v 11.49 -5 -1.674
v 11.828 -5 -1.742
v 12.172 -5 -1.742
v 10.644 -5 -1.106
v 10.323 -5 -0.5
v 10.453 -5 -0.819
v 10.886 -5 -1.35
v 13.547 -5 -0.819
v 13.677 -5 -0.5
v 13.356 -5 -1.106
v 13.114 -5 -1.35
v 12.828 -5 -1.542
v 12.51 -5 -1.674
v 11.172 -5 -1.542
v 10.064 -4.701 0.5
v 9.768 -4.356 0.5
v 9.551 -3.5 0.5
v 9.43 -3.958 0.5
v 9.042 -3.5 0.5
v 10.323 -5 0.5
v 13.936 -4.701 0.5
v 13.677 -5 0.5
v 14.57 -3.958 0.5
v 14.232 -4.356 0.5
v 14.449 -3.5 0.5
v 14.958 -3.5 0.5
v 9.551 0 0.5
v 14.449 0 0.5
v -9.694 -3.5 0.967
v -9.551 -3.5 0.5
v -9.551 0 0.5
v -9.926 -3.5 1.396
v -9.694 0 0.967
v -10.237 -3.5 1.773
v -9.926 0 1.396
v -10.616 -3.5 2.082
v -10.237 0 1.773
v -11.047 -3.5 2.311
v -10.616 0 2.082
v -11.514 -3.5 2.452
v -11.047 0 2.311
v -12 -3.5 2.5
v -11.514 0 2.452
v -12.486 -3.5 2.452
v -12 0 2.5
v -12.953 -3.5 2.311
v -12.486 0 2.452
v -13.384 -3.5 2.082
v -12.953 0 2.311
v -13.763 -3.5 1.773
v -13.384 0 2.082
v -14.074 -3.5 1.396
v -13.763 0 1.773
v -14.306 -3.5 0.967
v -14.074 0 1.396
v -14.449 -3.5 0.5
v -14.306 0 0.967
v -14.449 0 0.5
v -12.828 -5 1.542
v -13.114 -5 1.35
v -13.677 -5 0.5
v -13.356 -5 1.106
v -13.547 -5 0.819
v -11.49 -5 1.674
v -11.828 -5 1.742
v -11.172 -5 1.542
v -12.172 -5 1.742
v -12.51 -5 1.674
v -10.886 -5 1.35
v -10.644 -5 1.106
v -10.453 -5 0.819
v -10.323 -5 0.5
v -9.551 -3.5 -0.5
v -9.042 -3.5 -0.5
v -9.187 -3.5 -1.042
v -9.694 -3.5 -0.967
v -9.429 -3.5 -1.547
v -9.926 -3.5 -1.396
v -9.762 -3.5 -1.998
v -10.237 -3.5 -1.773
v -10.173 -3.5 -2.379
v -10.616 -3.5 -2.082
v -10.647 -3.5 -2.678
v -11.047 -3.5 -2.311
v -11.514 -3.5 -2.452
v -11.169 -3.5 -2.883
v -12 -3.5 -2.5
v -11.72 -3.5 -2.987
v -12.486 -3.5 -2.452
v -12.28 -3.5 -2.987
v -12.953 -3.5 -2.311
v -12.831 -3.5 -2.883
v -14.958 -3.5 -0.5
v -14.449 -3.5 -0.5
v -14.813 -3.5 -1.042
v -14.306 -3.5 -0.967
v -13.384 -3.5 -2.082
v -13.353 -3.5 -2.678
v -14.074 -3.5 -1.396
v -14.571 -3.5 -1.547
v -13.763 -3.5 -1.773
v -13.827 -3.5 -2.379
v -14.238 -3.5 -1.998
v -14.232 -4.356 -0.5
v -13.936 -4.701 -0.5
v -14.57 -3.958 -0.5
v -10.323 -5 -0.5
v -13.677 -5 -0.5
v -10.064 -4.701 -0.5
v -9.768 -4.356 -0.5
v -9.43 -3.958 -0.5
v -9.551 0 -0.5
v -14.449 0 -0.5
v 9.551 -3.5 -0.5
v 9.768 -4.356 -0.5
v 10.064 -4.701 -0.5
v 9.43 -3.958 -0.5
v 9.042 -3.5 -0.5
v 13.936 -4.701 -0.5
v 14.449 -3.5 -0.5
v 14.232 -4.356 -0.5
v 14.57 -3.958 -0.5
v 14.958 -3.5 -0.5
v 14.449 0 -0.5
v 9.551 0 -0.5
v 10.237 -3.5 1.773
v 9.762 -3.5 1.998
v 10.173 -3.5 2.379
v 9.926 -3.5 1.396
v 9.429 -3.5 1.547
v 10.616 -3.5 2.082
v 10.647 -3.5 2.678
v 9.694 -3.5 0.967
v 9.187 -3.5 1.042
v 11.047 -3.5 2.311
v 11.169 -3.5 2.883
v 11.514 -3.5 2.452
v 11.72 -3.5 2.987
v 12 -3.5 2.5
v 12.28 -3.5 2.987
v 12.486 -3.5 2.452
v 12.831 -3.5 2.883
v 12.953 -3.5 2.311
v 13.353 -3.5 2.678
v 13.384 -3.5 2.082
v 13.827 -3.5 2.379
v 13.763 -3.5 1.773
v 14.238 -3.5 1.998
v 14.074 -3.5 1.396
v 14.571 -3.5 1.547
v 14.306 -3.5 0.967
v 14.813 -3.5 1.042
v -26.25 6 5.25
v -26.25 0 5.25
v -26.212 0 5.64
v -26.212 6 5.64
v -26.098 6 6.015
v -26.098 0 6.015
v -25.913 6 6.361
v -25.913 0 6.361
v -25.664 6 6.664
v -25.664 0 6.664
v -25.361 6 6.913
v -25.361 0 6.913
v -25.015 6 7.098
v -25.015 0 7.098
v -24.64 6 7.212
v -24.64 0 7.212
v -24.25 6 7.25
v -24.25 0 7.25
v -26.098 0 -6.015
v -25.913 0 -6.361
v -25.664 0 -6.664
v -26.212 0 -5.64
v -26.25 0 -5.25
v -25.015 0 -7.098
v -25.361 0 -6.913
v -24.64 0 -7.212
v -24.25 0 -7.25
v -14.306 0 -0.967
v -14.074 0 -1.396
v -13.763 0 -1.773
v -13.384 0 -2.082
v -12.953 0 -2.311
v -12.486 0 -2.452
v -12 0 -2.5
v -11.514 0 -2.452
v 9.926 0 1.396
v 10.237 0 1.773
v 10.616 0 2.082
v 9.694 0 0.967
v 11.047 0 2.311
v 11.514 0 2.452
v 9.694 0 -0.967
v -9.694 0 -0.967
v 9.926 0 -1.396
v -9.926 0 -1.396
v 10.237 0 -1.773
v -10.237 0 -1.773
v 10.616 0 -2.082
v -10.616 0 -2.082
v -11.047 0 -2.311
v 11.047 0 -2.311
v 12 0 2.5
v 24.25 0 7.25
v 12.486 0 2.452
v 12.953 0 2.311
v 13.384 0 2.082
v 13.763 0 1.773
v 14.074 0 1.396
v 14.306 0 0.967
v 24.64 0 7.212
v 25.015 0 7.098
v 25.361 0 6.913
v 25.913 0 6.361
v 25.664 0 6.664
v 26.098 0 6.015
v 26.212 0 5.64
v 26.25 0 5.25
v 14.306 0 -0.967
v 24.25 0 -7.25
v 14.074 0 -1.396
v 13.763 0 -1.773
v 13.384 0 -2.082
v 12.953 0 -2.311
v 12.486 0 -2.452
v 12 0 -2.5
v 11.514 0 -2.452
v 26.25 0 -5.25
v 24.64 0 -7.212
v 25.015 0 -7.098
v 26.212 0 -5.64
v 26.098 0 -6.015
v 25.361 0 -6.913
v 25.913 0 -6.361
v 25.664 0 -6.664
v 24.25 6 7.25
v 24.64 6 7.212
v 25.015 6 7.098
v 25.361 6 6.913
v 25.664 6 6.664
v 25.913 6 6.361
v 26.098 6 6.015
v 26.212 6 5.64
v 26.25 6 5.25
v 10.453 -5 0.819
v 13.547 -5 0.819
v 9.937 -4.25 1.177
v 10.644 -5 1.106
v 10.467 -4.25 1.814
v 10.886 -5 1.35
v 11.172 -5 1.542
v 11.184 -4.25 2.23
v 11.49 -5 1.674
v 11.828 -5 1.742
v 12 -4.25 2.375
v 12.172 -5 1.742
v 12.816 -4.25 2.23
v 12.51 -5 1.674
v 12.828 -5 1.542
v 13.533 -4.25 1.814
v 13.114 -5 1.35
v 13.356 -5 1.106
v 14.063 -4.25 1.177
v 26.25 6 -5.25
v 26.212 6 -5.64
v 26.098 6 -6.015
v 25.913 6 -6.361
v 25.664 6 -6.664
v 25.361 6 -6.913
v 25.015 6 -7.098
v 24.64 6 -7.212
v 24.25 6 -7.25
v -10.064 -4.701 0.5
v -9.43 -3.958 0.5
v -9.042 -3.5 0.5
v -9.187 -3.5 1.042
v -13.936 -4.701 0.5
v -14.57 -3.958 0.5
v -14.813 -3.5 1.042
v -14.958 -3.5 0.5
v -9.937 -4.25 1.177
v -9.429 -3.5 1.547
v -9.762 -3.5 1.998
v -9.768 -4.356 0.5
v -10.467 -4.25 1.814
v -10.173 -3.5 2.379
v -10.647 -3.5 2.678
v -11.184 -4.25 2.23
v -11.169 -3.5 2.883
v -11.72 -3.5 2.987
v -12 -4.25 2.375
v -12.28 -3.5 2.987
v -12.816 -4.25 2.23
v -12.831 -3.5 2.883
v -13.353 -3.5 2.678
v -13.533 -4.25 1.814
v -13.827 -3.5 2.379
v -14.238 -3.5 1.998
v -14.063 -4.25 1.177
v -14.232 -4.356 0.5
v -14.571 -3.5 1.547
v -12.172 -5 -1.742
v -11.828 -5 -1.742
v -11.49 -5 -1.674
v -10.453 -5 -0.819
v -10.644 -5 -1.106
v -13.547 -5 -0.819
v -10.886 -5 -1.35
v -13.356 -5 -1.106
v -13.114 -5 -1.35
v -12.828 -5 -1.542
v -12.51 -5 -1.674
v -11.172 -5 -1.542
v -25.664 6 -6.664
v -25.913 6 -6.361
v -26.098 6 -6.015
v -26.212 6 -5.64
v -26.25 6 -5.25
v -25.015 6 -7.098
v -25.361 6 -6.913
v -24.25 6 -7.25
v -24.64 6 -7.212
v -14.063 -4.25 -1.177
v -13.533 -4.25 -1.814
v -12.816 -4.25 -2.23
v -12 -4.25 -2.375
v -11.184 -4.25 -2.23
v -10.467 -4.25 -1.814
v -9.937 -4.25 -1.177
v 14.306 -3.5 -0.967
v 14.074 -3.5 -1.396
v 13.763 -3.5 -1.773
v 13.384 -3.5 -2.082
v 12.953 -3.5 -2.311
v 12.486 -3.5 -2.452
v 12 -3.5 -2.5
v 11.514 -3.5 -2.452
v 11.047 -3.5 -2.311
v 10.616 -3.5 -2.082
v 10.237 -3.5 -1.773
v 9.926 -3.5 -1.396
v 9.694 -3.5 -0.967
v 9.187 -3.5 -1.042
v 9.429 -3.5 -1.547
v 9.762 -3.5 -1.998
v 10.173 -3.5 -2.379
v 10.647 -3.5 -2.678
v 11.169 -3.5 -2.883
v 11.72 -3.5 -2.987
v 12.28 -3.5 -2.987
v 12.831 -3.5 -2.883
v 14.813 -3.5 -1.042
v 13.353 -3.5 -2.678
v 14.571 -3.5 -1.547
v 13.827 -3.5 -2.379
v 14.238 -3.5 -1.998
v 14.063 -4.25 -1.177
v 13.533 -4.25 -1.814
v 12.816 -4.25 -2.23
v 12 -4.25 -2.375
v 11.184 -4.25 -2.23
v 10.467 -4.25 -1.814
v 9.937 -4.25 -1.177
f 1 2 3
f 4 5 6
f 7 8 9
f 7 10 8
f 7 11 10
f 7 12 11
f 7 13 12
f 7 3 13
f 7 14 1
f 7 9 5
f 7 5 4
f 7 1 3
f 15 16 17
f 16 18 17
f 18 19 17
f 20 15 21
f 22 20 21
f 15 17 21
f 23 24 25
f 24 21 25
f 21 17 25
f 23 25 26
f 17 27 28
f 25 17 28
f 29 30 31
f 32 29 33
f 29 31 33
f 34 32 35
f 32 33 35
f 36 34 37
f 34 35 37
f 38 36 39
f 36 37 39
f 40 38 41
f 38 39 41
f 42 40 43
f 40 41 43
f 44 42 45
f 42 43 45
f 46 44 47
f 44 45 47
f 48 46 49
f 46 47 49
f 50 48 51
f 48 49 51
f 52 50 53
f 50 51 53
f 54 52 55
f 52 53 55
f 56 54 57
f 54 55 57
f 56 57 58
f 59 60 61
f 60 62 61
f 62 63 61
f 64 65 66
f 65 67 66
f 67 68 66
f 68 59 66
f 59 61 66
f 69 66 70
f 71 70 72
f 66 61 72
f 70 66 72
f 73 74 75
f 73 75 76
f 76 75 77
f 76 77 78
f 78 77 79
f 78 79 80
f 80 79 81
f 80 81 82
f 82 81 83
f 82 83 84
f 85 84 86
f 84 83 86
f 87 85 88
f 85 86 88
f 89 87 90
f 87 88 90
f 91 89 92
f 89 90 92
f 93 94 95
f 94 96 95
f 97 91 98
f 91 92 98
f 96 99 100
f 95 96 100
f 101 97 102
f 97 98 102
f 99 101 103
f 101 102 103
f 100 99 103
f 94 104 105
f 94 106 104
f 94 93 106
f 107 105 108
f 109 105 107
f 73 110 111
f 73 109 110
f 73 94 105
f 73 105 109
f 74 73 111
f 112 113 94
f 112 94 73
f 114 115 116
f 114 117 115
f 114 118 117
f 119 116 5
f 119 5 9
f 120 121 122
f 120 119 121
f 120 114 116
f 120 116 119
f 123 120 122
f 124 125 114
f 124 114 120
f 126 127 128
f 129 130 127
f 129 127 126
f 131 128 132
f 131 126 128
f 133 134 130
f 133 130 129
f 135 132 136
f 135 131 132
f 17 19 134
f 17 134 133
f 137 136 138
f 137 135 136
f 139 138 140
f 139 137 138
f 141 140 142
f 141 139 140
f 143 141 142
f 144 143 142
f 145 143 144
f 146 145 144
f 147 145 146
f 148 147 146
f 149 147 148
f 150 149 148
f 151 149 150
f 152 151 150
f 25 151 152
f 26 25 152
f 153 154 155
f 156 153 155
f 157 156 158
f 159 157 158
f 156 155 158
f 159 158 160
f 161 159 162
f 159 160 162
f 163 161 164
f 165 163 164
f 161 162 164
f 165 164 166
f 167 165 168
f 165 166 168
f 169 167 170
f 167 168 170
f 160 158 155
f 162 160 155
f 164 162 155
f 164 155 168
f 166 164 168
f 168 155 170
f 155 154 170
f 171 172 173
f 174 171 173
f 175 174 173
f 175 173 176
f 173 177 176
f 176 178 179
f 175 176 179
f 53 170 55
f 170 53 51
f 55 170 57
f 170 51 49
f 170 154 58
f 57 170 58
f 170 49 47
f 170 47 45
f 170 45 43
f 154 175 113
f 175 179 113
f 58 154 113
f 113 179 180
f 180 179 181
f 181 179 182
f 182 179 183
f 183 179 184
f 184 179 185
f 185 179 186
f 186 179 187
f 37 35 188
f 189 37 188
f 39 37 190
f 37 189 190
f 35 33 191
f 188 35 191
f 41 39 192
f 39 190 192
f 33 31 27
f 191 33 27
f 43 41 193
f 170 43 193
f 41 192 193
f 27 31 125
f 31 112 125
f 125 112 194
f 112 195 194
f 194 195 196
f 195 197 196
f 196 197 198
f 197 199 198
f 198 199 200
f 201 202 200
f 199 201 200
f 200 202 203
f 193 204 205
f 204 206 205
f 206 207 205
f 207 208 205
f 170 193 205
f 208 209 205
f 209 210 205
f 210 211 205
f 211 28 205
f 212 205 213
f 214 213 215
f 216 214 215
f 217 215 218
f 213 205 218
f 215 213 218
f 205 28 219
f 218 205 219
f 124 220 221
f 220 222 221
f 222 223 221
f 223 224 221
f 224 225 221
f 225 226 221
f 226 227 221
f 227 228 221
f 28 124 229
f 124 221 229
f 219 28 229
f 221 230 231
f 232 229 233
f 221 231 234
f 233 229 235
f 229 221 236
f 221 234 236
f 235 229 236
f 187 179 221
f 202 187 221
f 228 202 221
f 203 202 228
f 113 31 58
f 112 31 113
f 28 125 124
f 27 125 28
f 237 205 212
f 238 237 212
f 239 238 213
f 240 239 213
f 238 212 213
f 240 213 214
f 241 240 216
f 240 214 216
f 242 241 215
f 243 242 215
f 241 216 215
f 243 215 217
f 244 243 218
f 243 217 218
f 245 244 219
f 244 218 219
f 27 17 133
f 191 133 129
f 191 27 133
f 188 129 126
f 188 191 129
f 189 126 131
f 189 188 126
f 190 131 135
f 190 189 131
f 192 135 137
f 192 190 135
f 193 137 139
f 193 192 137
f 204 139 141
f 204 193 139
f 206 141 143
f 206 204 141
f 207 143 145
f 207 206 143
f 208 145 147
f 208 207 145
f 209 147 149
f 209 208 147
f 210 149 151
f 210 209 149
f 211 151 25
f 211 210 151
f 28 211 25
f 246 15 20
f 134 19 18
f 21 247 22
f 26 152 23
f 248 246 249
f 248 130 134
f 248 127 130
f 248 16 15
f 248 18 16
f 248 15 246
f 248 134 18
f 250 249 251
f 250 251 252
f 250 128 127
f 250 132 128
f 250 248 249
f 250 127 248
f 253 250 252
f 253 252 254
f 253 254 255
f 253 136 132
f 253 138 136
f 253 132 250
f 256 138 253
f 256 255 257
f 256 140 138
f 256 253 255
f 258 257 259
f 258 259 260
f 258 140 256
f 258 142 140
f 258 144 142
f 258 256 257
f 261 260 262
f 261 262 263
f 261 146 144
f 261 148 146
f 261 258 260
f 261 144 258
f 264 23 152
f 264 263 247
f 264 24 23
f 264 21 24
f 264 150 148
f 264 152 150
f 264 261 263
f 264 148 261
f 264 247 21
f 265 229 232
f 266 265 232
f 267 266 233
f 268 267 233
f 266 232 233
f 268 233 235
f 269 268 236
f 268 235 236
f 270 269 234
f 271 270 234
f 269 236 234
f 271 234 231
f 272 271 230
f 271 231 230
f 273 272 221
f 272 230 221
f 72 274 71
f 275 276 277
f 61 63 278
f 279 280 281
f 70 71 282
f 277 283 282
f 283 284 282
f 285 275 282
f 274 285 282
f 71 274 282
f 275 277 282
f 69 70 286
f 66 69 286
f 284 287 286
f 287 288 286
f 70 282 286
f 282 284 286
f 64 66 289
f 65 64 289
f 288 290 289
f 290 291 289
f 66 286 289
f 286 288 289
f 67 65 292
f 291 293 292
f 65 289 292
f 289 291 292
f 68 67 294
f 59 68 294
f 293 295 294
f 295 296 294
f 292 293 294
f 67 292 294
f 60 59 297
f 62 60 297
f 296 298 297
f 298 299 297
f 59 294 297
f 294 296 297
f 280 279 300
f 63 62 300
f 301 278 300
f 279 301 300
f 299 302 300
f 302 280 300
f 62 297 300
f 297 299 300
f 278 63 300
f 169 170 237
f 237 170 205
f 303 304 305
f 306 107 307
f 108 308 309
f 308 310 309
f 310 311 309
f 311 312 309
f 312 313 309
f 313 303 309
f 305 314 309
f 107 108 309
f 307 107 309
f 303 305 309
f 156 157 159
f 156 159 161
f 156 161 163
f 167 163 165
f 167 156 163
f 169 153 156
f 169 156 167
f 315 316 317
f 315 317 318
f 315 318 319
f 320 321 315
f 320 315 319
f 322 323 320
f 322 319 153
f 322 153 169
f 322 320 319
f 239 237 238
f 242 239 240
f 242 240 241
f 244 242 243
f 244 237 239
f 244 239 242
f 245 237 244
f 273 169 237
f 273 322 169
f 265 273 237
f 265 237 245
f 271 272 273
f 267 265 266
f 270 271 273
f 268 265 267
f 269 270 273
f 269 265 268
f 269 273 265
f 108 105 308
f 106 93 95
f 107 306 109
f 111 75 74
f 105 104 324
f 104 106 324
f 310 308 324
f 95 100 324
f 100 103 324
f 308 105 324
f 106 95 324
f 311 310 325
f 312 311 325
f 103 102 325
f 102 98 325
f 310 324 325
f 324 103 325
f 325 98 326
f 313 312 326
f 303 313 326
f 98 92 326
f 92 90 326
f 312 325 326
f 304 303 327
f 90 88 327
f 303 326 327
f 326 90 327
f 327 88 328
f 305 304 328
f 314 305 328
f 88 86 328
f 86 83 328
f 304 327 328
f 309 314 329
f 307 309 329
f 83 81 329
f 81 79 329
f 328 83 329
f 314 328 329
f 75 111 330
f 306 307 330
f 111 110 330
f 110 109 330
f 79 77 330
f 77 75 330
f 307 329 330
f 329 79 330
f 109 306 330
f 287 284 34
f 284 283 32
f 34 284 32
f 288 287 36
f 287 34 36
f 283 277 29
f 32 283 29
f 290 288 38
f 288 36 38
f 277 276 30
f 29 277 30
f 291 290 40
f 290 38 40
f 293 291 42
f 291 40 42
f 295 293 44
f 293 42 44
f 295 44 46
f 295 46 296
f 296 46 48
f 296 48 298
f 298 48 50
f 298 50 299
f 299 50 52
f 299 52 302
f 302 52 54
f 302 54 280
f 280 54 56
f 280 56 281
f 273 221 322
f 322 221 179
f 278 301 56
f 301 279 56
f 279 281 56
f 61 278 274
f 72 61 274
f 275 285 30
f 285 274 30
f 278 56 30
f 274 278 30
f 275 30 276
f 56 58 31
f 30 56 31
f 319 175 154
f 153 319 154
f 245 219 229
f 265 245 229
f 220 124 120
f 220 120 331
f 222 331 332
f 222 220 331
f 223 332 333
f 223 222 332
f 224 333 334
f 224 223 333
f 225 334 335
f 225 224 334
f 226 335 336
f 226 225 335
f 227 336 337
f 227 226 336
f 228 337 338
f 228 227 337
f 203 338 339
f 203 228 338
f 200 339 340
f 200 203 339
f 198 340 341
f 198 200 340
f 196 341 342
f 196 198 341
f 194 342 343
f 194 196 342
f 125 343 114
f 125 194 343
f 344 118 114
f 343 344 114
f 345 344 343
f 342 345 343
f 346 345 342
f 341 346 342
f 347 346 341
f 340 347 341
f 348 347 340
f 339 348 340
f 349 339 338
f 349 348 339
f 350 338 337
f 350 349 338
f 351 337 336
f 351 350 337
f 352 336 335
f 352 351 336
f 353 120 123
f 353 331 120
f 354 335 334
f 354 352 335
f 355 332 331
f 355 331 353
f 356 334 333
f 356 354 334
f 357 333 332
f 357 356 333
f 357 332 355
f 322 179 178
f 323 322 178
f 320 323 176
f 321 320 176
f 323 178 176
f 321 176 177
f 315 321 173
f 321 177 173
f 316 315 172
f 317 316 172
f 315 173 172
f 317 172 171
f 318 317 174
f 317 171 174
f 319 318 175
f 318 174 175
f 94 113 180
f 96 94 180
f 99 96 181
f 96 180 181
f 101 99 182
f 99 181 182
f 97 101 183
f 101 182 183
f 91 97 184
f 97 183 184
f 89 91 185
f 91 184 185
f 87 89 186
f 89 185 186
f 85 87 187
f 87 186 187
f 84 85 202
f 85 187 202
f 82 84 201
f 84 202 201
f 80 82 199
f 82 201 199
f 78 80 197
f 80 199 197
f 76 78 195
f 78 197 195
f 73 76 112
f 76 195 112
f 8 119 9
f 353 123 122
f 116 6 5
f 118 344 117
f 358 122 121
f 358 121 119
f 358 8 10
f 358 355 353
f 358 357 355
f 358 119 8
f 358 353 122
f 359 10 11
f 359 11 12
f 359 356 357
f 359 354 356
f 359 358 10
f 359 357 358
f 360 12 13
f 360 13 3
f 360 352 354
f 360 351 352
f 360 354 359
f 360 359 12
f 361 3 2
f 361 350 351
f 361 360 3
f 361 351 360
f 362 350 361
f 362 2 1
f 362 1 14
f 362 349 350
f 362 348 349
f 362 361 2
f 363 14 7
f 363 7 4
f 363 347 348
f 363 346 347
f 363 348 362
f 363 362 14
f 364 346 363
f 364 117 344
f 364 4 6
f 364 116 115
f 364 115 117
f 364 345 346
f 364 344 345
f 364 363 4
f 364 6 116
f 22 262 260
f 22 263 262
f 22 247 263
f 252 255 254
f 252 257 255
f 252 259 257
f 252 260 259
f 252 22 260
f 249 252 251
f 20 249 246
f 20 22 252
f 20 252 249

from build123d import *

# Parameters (mm, degrees)
EXTRUSION1_DEPTH        = 6
ESQUISSE7_W             = 30
ESQUISSE7_H             = 1
ENL_V_MAT_EXTRU_1_DEPTH = 6


with BuildPart() as part:
    # Esquisse1 → Extrusion1 (new body)
    with BuildSketch(Plane(origin=(0, 0, 0), x_dir=(1, 0, 0), z_dir=(0, 1, 0))):
        with BuildLine():
            Line((-24.25, -7.25), (24.25, -7.25))
            ThreePointArc((24.25, -7.25), (25.664213562, -6.664213562), (26.25, -5.25))
            Line((26.25, -5.25), (26.25, 5.25))
            ThreePointArc((26.25, 5.25), (25.664213562, 6.664213562), (24.25, 7.25))
            Line((24.25, 7.25), (-24.25, 7.25))
            ThreePointArc((-24.25, 7.25), (-25.664213562, 6.664213562), (-26.25, 5.25))
            Line((-26.25, 5.25), (-26.25, -5.25))
            ThreePointArc((-26.25, -5.25), (-25.664213562, -6.664213562), (-24.25, -7.25))
        make_face()
    extrude(amount=EXTRUSION1_DEPTH)

    # Esquisse6 → Révolution1 (revolve)
    with BuildSketch(Plane.XY):
        Polygon((-12, 0), (-12, -5), (-13.75, -5), (-15, -3.5), (-14.5, -3.5), (-14.5, 0), align=None)
    r_volution1 = revolve(axis=Axis((-12, 10.671623644, 0), (0, -1, 0)))

    # Symétrie1: Révolution1 across plane
    add(r_volution1.mirror(Plane(origin=(0, 0, 0), x_dir=(0, 0, 1), z_dir=(1, 0, 0))))

    # Esquisse7 → Enlèv. mat.-Extru.1 (cut, through all)
    with BuildSketch(Plane.XZ):
        Rectangle(ESQUISSE7_W, ESQUISSE7_H)
    extrude(amount=ENL_V_MAT_EXTRU_1_DEPTH, mode=Mode.SUBTRACT)


solid = part.part
